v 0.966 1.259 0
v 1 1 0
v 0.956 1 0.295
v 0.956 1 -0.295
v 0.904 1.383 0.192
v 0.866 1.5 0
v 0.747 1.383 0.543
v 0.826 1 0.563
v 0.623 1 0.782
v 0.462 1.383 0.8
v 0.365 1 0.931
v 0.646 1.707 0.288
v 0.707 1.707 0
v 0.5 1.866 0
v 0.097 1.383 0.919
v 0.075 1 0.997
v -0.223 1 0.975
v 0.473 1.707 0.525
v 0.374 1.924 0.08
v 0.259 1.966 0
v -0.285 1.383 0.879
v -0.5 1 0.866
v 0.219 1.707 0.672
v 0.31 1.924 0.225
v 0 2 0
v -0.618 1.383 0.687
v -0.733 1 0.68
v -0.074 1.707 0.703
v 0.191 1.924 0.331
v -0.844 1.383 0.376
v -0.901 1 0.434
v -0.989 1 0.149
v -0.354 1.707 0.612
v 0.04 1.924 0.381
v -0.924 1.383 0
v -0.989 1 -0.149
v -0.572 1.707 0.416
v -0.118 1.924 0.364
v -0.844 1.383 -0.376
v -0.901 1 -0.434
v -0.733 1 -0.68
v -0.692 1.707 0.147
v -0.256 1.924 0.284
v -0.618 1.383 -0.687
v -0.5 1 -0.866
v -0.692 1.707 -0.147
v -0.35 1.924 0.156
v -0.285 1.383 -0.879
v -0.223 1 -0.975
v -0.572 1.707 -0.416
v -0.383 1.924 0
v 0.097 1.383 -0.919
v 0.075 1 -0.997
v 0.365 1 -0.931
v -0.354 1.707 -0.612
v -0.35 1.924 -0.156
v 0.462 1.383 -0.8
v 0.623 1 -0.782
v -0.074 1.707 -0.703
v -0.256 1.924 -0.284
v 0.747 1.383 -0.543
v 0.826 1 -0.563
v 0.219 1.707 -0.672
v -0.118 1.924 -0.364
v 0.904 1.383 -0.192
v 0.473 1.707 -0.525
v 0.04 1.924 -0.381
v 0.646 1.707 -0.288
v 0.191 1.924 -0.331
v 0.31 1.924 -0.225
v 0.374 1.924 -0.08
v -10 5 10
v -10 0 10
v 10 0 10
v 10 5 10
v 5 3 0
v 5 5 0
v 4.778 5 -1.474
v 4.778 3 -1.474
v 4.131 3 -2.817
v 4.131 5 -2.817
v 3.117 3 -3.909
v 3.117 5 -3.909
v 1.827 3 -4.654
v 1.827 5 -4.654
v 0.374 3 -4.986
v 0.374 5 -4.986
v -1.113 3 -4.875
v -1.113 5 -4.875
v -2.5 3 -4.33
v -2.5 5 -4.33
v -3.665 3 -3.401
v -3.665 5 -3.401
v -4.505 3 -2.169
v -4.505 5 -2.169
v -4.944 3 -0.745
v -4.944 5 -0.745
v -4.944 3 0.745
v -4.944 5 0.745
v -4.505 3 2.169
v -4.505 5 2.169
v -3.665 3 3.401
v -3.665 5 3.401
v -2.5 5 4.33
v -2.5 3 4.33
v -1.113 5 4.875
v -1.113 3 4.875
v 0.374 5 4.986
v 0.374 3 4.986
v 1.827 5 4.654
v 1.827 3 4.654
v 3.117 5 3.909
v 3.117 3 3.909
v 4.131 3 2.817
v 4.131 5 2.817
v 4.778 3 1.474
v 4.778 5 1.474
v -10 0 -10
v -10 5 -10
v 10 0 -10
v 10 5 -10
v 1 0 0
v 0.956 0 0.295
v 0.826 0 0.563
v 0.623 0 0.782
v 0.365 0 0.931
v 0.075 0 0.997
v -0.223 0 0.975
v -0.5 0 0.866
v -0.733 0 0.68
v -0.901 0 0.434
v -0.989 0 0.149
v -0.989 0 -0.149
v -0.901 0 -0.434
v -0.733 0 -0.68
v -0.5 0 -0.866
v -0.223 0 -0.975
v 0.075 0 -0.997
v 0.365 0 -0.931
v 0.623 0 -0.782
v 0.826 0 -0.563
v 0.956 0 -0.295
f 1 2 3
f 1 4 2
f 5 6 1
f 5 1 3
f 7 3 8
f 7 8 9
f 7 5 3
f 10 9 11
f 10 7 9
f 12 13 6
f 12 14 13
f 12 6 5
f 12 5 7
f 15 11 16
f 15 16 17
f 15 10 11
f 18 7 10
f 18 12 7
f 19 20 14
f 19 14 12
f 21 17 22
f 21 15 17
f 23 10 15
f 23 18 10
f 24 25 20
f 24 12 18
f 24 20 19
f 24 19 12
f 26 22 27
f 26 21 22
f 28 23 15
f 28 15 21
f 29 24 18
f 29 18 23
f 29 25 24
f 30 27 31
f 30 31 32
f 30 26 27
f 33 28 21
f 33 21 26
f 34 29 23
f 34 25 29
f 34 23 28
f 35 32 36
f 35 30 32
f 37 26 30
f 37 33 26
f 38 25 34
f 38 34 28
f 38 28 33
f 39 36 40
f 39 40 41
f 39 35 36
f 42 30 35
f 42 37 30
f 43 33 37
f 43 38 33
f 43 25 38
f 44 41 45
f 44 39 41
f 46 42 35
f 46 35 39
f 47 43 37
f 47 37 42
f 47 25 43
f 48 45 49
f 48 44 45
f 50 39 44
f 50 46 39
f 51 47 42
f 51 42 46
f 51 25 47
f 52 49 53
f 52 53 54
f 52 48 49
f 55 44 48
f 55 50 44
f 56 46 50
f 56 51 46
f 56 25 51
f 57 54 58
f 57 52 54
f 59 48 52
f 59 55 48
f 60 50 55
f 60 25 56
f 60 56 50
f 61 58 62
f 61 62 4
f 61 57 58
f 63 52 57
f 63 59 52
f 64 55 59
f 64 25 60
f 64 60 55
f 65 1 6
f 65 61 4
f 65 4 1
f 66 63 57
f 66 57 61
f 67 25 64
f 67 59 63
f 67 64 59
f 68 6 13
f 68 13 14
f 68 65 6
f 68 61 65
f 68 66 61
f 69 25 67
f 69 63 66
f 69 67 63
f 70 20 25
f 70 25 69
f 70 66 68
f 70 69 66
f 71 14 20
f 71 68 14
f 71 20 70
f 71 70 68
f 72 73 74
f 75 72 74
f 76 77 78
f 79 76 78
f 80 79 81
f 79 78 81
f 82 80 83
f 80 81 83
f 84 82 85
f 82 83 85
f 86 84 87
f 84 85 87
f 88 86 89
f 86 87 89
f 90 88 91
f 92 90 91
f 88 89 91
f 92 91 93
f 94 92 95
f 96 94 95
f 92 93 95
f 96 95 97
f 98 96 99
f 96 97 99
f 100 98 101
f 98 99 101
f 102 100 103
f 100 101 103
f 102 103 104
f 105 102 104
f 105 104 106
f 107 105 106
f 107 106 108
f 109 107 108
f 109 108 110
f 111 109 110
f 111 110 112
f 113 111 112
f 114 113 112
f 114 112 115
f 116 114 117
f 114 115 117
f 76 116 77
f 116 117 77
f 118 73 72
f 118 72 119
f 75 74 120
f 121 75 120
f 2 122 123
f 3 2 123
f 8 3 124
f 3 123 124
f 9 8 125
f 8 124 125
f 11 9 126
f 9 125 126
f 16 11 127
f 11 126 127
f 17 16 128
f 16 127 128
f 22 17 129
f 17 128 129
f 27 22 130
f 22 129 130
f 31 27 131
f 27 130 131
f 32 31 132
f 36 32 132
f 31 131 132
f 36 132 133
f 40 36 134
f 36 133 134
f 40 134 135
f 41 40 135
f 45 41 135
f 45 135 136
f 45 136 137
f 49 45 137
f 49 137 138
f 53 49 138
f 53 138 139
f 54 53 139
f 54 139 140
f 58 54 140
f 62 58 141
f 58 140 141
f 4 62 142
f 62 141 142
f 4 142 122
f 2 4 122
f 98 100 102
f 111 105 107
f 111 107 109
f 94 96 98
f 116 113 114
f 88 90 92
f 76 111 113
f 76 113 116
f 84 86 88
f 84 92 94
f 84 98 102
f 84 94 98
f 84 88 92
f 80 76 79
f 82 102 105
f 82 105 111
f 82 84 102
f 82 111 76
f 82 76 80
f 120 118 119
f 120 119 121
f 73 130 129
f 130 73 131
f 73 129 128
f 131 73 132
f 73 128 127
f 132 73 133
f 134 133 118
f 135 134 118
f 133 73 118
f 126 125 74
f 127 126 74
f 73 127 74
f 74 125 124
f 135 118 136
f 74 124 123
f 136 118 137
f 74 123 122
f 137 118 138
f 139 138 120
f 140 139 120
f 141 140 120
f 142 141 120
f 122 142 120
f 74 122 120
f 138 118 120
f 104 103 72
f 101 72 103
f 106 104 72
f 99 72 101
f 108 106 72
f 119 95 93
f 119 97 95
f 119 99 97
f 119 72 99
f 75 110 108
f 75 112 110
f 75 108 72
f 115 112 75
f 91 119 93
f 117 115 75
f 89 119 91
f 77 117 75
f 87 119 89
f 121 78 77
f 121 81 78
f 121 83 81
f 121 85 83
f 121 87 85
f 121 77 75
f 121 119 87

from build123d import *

# Parameters (mm, degrees)
SKETCH1_W           = 20
SKETCH1_H           = 20
BOSS_EXTRUDE1_DEPTH = 5
SKETCH2_R           = 5
CUT_EXTRUDE1_DEPTH  = 2
SKETCH3_R           = 1
CUT_EXTRUDE2_DEPTH  = 2
FILLET1_R           = 1


with BuildPart() as part:
    # Sketch1 → Boss-Extrude1 (new body)
    with BuildSketch(Plane(origin=(0, 0, 0), x_dir=(1, 0, 0), z_dir=(0, 1, 0))):
        Rectangle(SKETCH1_W, SKETCH1_H)
    extrude(amount=BOSS_EXTRUDE1_DEPTH)

    # Sketch2 → Cut-Extrude1 (cut)
    with BuildSketch(Plane(origin=(0, 5, 0), x_dir=(1, 0, 0), z_dir=(0, 1, 0))):
        Circle(SKETCH2_R)
    extrude(amount=-CUT_EXTRUDE1_DEPTH, mode=Mode.SUBTRACT)

    # Sketch3 → Cut-Extrude2 (cut)
    with BuildSketch(Plane.XZ):
        Circle(SKETCH3_R)
    extrude(amount=-CUT_EXTRUDE2_DEPTH, mode=Mode.SUBTRACT)

    # Fillet1
    fillet1_edges = [part.edges().sort_by_distance(p)[0] for p in [
        (-1, 2, 0),
    ]]
    fillet(fillet1_edges, radius=FILLET1_R)


solid = part.part
